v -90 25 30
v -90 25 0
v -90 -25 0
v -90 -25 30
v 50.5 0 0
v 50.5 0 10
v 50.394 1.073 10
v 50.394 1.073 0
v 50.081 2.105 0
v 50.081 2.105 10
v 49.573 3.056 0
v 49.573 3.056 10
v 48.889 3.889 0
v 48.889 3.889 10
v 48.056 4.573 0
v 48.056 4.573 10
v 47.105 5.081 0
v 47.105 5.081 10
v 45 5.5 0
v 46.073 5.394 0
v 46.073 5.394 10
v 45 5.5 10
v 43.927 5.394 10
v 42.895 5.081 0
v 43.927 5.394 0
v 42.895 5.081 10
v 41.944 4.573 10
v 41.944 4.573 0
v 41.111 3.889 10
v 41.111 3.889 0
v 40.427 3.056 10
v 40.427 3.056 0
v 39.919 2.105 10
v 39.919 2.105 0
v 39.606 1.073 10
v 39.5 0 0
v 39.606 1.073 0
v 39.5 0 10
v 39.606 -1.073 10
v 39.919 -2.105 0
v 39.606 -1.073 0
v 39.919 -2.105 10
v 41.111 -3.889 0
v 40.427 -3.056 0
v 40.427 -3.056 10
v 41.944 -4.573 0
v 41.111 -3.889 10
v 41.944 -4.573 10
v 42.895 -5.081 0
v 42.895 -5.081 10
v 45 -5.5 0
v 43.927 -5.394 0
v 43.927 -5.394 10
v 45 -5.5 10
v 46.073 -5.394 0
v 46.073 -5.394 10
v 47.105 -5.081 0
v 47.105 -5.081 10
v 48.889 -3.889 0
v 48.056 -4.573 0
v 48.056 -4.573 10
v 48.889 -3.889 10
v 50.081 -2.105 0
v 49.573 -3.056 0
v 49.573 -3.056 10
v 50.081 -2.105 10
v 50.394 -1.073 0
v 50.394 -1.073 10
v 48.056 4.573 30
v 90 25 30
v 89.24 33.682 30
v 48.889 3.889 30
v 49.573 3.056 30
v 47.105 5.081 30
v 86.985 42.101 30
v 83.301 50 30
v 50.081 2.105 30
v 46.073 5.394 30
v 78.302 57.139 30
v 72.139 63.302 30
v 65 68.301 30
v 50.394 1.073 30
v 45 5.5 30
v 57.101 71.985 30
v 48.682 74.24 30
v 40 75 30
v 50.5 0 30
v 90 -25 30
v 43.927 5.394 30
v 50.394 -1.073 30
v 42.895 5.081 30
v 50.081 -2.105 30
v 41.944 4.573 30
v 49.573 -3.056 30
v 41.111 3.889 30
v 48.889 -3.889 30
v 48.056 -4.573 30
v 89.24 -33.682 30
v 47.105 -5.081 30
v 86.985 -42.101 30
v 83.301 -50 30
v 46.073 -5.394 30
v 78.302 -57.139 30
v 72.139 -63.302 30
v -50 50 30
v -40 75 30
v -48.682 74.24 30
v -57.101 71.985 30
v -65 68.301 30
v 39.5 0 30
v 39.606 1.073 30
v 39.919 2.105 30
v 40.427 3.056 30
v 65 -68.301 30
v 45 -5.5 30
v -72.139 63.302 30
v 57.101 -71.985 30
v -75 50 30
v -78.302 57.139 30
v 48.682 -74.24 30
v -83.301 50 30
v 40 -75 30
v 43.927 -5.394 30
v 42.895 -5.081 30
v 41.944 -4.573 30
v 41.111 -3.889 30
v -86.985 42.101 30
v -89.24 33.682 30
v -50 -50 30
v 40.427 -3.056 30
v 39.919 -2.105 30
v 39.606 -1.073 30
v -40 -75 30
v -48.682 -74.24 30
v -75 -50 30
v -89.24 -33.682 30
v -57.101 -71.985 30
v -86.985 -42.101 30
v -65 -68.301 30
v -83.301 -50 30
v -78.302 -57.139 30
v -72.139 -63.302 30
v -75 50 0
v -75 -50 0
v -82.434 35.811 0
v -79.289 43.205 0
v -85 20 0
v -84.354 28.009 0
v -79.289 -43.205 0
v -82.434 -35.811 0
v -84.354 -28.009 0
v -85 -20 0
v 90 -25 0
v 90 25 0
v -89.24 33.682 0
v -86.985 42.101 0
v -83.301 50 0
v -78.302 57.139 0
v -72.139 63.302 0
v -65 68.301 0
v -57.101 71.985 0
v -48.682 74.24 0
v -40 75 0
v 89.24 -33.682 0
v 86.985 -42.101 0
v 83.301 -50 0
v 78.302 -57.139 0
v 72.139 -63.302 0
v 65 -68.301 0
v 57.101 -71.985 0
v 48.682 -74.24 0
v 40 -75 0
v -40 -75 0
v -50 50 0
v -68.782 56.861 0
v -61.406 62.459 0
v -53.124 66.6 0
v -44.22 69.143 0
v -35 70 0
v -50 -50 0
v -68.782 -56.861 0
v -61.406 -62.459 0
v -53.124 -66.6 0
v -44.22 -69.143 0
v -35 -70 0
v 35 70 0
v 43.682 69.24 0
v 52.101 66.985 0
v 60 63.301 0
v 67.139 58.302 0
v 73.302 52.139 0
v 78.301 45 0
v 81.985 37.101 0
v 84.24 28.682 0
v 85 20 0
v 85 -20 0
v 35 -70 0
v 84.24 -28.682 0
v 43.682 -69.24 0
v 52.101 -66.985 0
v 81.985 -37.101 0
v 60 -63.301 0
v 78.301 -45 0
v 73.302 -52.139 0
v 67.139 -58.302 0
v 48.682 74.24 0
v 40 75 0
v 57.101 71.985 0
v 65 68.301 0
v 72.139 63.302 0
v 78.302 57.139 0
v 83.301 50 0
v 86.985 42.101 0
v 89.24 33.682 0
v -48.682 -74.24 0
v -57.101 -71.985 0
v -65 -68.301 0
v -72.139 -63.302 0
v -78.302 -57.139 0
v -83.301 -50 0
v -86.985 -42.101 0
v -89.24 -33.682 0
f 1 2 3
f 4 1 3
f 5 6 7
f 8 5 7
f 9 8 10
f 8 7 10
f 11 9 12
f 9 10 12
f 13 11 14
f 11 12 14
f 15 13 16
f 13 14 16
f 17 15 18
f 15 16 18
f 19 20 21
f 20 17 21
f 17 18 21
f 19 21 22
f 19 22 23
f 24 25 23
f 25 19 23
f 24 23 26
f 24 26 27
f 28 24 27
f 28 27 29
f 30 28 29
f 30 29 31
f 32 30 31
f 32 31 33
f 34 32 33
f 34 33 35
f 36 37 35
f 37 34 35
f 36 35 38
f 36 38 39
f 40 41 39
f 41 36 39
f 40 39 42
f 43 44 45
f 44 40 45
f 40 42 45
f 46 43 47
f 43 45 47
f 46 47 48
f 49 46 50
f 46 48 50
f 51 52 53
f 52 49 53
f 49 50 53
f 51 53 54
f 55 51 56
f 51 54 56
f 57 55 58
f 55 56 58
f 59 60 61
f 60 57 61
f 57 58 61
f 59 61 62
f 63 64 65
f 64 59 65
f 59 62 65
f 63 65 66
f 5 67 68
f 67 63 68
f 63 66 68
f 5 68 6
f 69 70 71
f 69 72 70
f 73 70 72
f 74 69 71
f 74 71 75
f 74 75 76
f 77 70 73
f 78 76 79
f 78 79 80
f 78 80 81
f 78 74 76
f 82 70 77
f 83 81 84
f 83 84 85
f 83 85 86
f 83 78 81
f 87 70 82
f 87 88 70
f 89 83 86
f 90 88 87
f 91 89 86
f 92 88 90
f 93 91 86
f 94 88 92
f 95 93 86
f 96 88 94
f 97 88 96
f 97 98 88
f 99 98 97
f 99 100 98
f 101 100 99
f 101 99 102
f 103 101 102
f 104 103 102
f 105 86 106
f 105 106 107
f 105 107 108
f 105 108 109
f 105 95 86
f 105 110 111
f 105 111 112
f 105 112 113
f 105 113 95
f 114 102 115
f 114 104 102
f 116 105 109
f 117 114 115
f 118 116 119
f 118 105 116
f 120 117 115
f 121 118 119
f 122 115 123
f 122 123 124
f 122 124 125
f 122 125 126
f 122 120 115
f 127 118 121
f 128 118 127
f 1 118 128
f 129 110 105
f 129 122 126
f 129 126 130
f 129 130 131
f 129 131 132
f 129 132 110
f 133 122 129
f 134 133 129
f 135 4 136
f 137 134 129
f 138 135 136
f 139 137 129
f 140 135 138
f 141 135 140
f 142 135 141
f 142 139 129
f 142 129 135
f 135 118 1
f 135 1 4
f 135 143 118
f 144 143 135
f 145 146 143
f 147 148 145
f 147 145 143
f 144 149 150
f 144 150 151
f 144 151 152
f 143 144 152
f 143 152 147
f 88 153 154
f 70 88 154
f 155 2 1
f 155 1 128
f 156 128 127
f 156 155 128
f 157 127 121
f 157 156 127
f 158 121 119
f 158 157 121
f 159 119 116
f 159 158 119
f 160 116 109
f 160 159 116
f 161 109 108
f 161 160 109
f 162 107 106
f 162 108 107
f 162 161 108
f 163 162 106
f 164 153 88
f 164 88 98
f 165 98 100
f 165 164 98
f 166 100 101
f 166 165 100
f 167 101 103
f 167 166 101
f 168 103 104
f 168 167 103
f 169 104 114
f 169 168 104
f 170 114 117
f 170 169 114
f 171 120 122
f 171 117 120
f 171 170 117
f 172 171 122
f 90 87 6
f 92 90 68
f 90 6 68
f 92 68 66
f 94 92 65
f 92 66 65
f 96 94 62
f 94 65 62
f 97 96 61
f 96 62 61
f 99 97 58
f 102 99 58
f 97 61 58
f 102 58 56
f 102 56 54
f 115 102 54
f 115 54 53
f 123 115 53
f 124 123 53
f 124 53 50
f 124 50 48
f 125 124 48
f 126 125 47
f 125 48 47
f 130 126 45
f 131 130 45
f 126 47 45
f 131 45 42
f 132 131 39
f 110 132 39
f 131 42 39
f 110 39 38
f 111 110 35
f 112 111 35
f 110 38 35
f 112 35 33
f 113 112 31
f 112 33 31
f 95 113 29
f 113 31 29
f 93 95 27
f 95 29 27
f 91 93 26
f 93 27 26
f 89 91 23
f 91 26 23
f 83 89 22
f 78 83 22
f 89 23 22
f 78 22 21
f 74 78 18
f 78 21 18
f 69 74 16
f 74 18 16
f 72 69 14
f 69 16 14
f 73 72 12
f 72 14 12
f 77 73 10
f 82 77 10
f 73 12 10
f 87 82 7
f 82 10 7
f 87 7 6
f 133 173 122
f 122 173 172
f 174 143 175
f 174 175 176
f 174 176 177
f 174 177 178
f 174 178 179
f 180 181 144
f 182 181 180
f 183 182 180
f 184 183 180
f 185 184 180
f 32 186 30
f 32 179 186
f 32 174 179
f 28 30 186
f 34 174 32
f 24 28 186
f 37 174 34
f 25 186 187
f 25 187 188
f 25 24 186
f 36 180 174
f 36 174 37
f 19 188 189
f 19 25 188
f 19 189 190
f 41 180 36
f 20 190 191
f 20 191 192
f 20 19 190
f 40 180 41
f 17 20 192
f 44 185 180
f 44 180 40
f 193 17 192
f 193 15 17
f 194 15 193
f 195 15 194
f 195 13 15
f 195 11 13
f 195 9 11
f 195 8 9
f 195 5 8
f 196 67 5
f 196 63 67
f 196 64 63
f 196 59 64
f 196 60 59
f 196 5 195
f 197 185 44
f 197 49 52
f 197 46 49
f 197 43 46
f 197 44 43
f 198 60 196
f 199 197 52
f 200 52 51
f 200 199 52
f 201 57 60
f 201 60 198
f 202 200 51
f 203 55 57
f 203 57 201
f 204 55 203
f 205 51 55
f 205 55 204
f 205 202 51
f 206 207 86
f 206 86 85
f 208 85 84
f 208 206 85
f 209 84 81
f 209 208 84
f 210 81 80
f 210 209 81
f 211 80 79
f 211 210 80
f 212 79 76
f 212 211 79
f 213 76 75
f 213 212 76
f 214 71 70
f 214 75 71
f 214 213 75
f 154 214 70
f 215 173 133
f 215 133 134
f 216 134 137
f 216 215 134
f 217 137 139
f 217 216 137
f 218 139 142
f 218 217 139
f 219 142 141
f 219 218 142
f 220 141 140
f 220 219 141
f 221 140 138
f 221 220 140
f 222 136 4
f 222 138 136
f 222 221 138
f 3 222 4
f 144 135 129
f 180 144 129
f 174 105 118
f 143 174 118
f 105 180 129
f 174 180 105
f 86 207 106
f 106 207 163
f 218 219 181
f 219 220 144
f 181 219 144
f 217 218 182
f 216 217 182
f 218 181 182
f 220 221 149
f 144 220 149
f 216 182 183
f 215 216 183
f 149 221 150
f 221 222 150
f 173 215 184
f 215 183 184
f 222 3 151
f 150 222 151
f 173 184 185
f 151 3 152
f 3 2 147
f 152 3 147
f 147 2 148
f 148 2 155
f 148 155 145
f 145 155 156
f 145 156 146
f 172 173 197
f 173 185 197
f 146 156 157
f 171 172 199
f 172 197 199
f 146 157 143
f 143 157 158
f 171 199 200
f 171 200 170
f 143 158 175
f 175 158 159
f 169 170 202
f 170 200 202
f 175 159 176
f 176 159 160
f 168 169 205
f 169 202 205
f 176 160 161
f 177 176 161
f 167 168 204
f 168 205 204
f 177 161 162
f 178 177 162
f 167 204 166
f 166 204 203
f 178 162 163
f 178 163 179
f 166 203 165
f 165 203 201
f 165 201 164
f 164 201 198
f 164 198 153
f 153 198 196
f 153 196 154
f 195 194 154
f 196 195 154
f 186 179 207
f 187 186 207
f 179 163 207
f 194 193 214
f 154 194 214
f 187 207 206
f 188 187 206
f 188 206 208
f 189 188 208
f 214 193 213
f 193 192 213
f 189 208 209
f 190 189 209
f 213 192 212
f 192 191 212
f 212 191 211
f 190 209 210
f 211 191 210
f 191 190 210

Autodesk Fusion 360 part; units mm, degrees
sketch "Sketch1" plane through (0, 0, 0) normal (0, 0, 1) x (1, 0, 0)
  line L0 (-40, -75) -> (40, -75)
  line L1 (90, -25) -> (90, 25)
  line L2 (40, 75) -> (-40, 75)
  line L3 (-90, 25) -> (-90, -25)
  line L4 (-90, -75) -> (90, 75) construction
  line L5 (90, -75) -> (-90, 75) construction
  arc A0 (40, -75) -> (90, -25) centre (40, -25) ccw
  arc A1 (90, 25) -> (40, 75) centre (40, 25) ccw
  arc A2 (-90, -25) -> (-40, -75) centre (-40, -25) ccw
  arc A3 (-40, 75) -> (-90, 25) centre (-40, 25) ccw
extrude "Extrude1" add sketch "Sketch1" along normal blind 30
sketch "Sketch2" plane through (0, 0, 30) normal (0, 0, 1) x (-1, 0, 0)
  arc A0 (40, -75) -> (90, -25) centre (40, -25) ccw
  line L0 (90, -25) -> (90, 25)
  arc A1 (90, 25) -> (40, 75) centre (40, 25) ccw
  line L1 (40, 75) -> (-40, 75)
  arc A2 (-40, 75) -> (-90, 25) centre (-40, 25) ccw
  line L2 (-90, 25) -> (-90, -25)
  arc A3 (-90, -25) -> (-40, -75) centre (-40, -25) ccw
  line L3 (-40, -75) -> (40, -75)
  line L4 (35, 70) -> (-35, 70)
  line L5 (-85, 20) -> (-85, -20)
  line L6 (-35, -70) -> (35, -70)
  line L7 (85, -20) -> (85, 20)
  line L8 (85, 70) -> (-85, -70) construction
  line L9 (-85, 70) -> (85, -70) construction
  arc A4 (-35, 70) -> (-85, 20) centre (-35, 20) ccw
  arc A5 (-85, -20) -> (-35, -70) centre (-35, -20) ccw
  arc A6 (85, 20) -> (35, 70) centre (35, 20) ccw
  arc A7 (35, -70) -> (85, -20) centre (35, -20) ccw
  dimension "d9" = 140
  dimension "d10" = 170
  dimension "d11" = 50
  dimension "d12" = 50
  dimension "d13" = 50
  dimension "d14" = 50
extrude "Extrude2" cut sketch "Sketch2" against normal blind 10 contours L4 L5 L6 L7 A4 A5 A6 A7
sketch "Sketch3" plane through (0, 0, 0) normal (0, 0, -1) x (1, 0, 0)
  arc A0 (-90, -25) -> (-40, -75) centre (-40, -25) ccw
  line L0 (-40, -75) -> (40, -75)
  arc A1 (40, -75) -> (90, -25) centre (40, -25) ccw
  line L1 (90, -25) -> (90, 25)
  arc A2 (90, 25) -> (40, 75) centre (40, 25) ccw
  line L2 (40, 75) -> (-40, 75)
  arc A3 (-40, 75) -> (-90, 25) centre (-40, 25) ccw
  line L3 (-90, 25) -> (-90, -25)
  line L4 (-35, -70) -> (35, -70)
  line L5 (85, -20) -> (85, 20)
  line L6 (35, 70) -> (-35, 70)
  line L7 (-85, 20) -> (-85, -20)
  line L8 (-85, -70) -> (85, 70) construction
  line L9 (85, -70) -> (-85, 70) construction
  arc A4 (35, -70) -> (85, -20) centre (35, -20) ccw
  arc A5 (85, 20) -> (35, 70) centre (35, 20) ccw
  arc A6 (-85, -20) -> (-35, -70) centre (-35, -20) ccw
  arc A7 (-35, 70) -> (-85, 20) centre (-35, 20) ccw
  dimension "d17" = 140
  dimension "d18" = 170
  dimension "d19" = 50
  dimension "d20" = 50
  dimension "d21" = 50
  dimension "d22" = 50
extrude "Extrude3" cut sketch "Sketch3" against normal blind 10 contours L4 L5 L6 L7 A4 A5 A6 A7
sketch "Sketch4" plane through (0, 0, 10) normal (0, 0, -1) x (1, 0, 0)
  arc A0 (-35, 70) -> (-85, 20) centre (-35, 20) ccw
  line L0 (-85, 20) -> (-85, -20)
  arc A1 (-85, -20) -> (-35, -70) centre (-35, -20) ccw
  line L1 (-35, -70) -> (35, -70)
  arc A2 (35, -70) -> (85, -20) centre (35, -20) ccw
  line L2 (85, -20) -> (85, 20)
  arc A3 (85, 20) -> (35, 70) centre (35, 20) ccw
  line L3 (35, 70) -> (-35, 70)
  line L4 (90, 0) -> (45, 0)
  circle A4 centre (45, 0) radius 5.5
  dimension "d25" = 45
  dimension "d26" = 11
extrude "Extrude4" cut sketch "Sketch4" against normal blind 10 contours A4
extrude "Extrude5" add 1 faces at (-26.8129, 30.2732, 20) along direction (0, 0, 1) blind 10
extrude "Extrude6" add 1 faces at (-26.8129, 30.2732, 10) along direction (0, 0, -1) blind 10
sketch "Sketch5" plane through (0, 0, 0) normal (0, 0, -1) x (1, 0, 0)
  circle A0 centre (45, 0) radius 5.5
  arc A1 (-90, -25) -> (-40, -75) centre (-40, -25) ccw
  line L0 (-40, -75) -> (40, -75)
  arc A2 (40, -75) -> (90, -25) centre (40, -25) ccw
  line L1 (90, -25) -> (90, 25)
  arc A3 (90, 25) -> (40, 75) centre (40, 25) ccw
  line L2 (40, 75) -> (-40, 75)
  arc A4 (-40, 75) -> (-90, 25) centre (-40, 25) ccw
  line L3 (-90, 25) -> (-90, -25)
  line L4 (-75, 50) -> (-50, 50)
  line L5 (-50, 50) -> (-50, -50)
  line L6 (-50, -50) -> (-75, -50)
  line L7 (-75, -50) -> (-75, 50)
extrude "Extrude7" cut sketch "Sketch5" against normal blind 65 contours L4 L5 L6 L7
